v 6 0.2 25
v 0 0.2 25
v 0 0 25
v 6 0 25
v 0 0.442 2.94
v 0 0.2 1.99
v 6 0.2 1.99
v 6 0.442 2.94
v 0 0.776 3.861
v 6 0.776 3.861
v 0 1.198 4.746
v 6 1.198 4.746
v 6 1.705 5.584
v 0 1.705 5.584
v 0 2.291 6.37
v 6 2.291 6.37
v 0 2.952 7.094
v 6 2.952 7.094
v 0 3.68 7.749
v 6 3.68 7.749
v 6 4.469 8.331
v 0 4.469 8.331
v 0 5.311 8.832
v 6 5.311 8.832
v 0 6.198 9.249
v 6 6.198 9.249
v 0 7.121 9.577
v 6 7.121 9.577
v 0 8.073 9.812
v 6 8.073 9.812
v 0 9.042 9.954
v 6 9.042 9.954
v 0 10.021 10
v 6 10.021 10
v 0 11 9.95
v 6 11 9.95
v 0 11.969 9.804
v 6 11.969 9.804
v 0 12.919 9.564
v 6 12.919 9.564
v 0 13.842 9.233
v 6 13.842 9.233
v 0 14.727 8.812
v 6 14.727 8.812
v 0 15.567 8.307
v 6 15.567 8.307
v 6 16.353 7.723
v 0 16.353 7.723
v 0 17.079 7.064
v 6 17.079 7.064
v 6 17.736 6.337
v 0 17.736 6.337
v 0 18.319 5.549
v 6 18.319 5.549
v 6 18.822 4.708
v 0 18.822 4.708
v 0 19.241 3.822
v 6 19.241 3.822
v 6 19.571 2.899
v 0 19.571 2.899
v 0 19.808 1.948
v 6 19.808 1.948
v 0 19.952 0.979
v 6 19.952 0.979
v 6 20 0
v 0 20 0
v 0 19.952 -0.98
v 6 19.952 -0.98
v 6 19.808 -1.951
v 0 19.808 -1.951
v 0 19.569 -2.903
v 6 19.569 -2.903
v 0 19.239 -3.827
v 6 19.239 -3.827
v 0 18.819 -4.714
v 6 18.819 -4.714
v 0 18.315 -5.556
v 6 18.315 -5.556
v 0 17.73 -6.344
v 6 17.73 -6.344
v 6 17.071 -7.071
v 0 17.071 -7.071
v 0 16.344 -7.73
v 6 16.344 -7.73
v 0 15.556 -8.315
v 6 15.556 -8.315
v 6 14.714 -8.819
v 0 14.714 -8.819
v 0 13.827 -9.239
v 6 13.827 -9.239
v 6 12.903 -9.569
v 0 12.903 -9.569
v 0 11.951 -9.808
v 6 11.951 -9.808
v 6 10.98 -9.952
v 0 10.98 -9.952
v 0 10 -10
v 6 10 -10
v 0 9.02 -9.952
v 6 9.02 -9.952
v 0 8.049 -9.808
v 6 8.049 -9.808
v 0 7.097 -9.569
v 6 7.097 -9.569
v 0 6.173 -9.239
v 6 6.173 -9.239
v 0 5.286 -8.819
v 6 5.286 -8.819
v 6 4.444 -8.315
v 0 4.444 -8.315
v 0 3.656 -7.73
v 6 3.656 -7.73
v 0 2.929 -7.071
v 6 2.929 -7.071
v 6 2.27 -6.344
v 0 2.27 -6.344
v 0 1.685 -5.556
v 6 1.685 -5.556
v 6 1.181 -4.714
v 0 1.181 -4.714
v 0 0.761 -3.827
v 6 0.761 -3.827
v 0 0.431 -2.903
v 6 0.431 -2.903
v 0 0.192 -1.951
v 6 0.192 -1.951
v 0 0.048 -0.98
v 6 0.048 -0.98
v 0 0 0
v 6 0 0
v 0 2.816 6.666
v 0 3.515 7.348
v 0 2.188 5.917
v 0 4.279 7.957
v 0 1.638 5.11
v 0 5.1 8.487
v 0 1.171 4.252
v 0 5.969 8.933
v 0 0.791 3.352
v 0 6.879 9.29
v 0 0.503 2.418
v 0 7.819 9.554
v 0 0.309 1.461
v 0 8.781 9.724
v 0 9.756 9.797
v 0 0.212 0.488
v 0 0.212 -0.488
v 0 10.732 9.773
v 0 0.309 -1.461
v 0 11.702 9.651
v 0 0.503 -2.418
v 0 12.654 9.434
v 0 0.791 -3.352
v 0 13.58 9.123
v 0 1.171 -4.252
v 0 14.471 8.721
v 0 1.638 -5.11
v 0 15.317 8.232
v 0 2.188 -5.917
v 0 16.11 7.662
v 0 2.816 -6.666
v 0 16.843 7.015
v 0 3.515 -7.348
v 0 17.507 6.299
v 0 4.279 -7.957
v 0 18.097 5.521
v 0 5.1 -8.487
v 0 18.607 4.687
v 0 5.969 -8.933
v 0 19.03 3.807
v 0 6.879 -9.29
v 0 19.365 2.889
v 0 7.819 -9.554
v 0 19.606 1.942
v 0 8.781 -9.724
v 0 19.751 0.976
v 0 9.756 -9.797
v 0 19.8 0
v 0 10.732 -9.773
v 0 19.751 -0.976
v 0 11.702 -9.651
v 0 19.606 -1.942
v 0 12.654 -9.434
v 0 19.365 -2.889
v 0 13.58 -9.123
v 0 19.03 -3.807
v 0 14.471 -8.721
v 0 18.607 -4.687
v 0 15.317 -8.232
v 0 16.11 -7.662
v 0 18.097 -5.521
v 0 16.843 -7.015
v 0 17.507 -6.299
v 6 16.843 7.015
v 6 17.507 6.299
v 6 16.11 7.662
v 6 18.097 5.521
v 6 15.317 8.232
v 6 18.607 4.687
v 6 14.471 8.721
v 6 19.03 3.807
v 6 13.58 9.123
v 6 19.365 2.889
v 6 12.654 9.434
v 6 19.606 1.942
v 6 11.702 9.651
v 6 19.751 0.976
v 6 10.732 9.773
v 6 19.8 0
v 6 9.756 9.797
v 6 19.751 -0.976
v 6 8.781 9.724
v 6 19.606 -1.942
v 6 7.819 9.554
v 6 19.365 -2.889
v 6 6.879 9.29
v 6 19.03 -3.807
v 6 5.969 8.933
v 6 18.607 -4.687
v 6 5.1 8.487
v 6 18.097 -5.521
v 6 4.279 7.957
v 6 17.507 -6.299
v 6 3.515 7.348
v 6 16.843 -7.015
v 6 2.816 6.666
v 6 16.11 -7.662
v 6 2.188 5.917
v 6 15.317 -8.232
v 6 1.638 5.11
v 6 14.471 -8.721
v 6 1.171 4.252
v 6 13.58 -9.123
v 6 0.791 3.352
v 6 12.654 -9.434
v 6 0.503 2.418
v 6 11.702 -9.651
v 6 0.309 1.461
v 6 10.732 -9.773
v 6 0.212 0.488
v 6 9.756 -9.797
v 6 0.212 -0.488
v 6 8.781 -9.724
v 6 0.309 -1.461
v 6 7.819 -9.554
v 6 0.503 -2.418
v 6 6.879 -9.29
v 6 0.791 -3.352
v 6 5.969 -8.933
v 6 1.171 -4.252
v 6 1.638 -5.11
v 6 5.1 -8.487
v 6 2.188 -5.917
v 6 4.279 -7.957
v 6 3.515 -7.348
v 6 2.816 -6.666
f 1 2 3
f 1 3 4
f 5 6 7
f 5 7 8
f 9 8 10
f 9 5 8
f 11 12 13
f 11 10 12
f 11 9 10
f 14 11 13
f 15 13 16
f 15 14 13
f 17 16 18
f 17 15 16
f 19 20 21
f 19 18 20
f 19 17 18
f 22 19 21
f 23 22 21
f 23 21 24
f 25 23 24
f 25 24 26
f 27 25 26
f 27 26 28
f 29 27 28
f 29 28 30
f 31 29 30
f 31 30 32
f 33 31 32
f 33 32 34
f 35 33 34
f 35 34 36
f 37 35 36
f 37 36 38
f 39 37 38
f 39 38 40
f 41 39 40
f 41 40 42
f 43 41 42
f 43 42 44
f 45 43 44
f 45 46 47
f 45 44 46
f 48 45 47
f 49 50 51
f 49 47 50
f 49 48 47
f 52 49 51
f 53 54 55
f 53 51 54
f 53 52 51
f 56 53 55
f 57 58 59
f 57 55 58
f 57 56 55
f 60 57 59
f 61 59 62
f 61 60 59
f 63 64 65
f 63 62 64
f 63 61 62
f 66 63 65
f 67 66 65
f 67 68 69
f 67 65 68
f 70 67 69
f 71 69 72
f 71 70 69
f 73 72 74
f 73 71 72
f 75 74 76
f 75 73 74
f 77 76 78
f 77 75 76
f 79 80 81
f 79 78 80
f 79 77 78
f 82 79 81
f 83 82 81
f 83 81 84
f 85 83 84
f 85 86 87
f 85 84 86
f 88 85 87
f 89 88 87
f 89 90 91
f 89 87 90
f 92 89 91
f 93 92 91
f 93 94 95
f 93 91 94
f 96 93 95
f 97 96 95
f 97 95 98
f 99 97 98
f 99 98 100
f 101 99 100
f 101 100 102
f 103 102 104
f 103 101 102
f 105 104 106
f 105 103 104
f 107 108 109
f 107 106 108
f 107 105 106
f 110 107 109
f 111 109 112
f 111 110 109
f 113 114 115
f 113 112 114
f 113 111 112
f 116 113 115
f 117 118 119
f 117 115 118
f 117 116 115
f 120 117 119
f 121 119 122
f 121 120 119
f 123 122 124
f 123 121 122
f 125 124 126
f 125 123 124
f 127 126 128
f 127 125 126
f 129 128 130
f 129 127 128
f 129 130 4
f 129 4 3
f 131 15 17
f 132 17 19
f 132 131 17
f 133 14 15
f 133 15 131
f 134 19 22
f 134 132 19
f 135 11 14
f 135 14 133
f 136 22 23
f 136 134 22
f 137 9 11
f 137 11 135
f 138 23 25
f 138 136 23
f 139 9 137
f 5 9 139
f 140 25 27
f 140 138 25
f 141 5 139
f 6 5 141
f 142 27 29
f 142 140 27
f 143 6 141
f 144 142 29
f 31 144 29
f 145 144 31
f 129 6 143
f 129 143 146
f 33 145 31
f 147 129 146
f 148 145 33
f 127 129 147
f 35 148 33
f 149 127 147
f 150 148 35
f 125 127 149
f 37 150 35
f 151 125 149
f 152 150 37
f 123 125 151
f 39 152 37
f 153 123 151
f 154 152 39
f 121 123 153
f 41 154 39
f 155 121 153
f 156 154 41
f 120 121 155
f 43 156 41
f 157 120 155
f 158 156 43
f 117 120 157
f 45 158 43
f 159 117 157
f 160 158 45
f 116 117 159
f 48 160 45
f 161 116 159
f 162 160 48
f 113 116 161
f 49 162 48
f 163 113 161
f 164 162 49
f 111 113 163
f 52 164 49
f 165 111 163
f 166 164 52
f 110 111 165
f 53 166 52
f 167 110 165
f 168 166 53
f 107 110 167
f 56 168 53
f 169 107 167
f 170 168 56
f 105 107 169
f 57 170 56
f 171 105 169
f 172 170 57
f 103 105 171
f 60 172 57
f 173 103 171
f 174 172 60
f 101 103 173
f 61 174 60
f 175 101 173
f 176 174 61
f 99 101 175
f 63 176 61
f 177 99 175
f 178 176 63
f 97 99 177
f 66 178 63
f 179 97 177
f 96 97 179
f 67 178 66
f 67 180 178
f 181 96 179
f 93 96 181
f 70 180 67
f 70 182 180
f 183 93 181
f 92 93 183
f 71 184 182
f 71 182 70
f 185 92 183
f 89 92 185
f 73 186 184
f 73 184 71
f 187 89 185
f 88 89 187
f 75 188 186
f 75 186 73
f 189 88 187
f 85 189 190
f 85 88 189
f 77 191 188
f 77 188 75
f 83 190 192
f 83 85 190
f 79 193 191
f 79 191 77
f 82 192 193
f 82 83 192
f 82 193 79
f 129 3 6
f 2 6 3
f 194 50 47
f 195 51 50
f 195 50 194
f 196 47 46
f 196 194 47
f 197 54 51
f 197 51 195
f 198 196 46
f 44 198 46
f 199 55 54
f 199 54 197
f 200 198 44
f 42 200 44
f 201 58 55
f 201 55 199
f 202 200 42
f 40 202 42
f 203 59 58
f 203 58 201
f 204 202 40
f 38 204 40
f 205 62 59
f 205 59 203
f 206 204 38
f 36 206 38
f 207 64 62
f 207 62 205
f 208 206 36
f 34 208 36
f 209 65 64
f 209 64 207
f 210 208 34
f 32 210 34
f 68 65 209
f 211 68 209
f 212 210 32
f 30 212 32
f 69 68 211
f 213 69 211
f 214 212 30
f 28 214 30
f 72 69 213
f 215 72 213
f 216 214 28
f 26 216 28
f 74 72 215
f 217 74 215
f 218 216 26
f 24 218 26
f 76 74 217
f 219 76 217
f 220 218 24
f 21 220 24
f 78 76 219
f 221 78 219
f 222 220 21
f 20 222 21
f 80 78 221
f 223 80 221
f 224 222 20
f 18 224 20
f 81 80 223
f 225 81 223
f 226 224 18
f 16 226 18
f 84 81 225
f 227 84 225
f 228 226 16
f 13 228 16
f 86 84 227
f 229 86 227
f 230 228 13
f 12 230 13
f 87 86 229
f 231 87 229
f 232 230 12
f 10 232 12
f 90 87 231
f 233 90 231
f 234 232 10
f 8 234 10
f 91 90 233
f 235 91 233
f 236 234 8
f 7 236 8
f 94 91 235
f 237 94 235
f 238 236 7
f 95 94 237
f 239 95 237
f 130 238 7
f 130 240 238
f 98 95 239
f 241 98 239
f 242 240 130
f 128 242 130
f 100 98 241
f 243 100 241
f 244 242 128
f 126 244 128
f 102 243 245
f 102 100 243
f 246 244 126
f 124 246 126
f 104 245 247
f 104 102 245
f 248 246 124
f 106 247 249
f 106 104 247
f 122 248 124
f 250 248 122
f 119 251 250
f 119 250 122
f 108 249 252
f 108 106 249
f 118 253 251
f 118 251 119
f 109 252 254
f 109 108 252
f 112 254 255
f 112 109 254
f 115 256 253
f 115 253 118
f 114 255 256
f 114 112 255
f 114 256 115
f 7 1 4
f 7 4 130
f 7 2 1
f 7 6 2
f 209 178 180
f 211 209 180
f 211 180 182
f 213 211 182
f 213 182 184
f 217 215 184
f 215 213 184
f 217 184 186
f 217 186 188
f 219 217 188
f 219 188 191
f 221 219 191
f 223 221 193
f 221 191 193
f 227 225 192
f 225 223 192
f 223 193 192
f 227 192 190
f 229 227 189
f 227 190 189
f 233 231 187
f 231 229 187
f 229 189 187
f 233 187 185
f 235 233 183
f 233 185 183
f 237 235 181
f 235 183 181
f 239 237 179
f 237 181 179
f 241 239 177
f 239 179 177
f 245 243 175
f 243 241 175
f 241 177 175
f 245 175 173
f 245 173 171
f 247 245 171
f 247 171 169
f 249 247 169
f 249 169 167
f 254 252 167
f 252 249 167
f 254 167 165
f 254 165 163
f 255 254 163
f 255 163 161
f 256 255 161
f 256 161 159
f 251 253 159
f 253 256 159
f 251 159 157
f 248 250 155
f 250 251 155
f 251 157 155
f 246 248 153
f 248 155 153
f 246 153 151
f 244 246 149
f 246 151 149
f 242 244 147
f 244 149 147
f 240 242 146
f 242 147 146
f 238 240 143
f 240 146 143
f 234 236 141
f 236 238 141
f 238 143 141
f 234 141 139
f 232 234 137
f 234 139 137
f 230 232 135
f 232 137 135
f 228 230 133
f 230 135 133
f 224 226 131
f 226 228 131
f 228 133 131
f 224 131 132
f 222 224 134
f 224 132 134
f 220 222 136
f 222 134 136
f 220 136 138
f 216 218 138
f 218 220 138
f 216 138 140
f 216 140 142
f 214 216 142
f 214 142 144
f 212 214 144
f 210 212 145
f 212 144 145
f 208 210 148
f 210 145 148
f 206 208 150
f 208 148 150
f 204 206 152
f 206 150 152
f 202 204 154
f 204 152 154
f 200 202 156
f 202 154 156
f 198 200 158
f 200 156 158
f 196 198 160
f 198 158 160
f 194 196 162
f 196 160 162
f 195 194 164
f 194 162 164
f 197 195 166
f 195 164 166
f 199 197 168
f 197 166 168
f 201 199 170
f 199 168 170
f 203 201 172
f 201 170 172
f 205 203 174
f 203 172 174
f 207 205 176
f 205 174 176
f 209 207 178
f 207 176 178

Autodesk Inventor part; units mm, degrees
ref_plane "YZ Plane" through (0, 0, 0) normal (1, 0, 0) x (0, 1, 0)
ref_plane "XZ Plane" through (0, 0, 0) normal (0, 1, 0) x (-1, 0, 0)
ref_plane "XY Plane" through (0, 0, 0) normal (0, 0, 1) x (1, 0, 0)
sketch "Sketch1" plane through (0, 0, 0) normal (0, 0, 1) x (1, 0, 0)
  line L0 (0, 0) -> (6, 0)
  line L1 (6, 0) -> (6, 0.2)
  line L2 (6, 0.2) -> (0, 0.2)
  line L3 (0, 0.2) -> (0, 0)
  dimension "d0" = 0.2
  dimension "d1" = 6
extrude "Extrusion1" add sketch "Sketch1" along normal blind 10
sketch "Sketch2" plane through (0, 0, 0) normal (1, 0, 0) x (0, 1, 0)
  line L0 (0, 0) -> (0.2, 0) projected
  line L1 (0, 0) -> (10, 0)
  circle A0 centre (10, 0) radius 10
  circle A1 centre (10, 0) radius 9.8
  dimension "d4" = 10
extrude "Extrusion2" add sketch "Sketch2" along normal up to surface (6 mm away)
sketch "Sketch3" plane through (0, 0, 10) normal (0, 0, 1) x (1, 0, 0)
  line L0 (0, 0) -> (0, 0.2) projected
  line L1 (6, 0) -> (0, 0) projected
  line L2 (6, 0.2) -> (6, 0) projected
  line L3 (0, 0.2) -> (6, 0.2) projected
extrude "Extrusion3" add sketch "Sketch3" along normal blind 15
properties part number "FoilCoil2"
